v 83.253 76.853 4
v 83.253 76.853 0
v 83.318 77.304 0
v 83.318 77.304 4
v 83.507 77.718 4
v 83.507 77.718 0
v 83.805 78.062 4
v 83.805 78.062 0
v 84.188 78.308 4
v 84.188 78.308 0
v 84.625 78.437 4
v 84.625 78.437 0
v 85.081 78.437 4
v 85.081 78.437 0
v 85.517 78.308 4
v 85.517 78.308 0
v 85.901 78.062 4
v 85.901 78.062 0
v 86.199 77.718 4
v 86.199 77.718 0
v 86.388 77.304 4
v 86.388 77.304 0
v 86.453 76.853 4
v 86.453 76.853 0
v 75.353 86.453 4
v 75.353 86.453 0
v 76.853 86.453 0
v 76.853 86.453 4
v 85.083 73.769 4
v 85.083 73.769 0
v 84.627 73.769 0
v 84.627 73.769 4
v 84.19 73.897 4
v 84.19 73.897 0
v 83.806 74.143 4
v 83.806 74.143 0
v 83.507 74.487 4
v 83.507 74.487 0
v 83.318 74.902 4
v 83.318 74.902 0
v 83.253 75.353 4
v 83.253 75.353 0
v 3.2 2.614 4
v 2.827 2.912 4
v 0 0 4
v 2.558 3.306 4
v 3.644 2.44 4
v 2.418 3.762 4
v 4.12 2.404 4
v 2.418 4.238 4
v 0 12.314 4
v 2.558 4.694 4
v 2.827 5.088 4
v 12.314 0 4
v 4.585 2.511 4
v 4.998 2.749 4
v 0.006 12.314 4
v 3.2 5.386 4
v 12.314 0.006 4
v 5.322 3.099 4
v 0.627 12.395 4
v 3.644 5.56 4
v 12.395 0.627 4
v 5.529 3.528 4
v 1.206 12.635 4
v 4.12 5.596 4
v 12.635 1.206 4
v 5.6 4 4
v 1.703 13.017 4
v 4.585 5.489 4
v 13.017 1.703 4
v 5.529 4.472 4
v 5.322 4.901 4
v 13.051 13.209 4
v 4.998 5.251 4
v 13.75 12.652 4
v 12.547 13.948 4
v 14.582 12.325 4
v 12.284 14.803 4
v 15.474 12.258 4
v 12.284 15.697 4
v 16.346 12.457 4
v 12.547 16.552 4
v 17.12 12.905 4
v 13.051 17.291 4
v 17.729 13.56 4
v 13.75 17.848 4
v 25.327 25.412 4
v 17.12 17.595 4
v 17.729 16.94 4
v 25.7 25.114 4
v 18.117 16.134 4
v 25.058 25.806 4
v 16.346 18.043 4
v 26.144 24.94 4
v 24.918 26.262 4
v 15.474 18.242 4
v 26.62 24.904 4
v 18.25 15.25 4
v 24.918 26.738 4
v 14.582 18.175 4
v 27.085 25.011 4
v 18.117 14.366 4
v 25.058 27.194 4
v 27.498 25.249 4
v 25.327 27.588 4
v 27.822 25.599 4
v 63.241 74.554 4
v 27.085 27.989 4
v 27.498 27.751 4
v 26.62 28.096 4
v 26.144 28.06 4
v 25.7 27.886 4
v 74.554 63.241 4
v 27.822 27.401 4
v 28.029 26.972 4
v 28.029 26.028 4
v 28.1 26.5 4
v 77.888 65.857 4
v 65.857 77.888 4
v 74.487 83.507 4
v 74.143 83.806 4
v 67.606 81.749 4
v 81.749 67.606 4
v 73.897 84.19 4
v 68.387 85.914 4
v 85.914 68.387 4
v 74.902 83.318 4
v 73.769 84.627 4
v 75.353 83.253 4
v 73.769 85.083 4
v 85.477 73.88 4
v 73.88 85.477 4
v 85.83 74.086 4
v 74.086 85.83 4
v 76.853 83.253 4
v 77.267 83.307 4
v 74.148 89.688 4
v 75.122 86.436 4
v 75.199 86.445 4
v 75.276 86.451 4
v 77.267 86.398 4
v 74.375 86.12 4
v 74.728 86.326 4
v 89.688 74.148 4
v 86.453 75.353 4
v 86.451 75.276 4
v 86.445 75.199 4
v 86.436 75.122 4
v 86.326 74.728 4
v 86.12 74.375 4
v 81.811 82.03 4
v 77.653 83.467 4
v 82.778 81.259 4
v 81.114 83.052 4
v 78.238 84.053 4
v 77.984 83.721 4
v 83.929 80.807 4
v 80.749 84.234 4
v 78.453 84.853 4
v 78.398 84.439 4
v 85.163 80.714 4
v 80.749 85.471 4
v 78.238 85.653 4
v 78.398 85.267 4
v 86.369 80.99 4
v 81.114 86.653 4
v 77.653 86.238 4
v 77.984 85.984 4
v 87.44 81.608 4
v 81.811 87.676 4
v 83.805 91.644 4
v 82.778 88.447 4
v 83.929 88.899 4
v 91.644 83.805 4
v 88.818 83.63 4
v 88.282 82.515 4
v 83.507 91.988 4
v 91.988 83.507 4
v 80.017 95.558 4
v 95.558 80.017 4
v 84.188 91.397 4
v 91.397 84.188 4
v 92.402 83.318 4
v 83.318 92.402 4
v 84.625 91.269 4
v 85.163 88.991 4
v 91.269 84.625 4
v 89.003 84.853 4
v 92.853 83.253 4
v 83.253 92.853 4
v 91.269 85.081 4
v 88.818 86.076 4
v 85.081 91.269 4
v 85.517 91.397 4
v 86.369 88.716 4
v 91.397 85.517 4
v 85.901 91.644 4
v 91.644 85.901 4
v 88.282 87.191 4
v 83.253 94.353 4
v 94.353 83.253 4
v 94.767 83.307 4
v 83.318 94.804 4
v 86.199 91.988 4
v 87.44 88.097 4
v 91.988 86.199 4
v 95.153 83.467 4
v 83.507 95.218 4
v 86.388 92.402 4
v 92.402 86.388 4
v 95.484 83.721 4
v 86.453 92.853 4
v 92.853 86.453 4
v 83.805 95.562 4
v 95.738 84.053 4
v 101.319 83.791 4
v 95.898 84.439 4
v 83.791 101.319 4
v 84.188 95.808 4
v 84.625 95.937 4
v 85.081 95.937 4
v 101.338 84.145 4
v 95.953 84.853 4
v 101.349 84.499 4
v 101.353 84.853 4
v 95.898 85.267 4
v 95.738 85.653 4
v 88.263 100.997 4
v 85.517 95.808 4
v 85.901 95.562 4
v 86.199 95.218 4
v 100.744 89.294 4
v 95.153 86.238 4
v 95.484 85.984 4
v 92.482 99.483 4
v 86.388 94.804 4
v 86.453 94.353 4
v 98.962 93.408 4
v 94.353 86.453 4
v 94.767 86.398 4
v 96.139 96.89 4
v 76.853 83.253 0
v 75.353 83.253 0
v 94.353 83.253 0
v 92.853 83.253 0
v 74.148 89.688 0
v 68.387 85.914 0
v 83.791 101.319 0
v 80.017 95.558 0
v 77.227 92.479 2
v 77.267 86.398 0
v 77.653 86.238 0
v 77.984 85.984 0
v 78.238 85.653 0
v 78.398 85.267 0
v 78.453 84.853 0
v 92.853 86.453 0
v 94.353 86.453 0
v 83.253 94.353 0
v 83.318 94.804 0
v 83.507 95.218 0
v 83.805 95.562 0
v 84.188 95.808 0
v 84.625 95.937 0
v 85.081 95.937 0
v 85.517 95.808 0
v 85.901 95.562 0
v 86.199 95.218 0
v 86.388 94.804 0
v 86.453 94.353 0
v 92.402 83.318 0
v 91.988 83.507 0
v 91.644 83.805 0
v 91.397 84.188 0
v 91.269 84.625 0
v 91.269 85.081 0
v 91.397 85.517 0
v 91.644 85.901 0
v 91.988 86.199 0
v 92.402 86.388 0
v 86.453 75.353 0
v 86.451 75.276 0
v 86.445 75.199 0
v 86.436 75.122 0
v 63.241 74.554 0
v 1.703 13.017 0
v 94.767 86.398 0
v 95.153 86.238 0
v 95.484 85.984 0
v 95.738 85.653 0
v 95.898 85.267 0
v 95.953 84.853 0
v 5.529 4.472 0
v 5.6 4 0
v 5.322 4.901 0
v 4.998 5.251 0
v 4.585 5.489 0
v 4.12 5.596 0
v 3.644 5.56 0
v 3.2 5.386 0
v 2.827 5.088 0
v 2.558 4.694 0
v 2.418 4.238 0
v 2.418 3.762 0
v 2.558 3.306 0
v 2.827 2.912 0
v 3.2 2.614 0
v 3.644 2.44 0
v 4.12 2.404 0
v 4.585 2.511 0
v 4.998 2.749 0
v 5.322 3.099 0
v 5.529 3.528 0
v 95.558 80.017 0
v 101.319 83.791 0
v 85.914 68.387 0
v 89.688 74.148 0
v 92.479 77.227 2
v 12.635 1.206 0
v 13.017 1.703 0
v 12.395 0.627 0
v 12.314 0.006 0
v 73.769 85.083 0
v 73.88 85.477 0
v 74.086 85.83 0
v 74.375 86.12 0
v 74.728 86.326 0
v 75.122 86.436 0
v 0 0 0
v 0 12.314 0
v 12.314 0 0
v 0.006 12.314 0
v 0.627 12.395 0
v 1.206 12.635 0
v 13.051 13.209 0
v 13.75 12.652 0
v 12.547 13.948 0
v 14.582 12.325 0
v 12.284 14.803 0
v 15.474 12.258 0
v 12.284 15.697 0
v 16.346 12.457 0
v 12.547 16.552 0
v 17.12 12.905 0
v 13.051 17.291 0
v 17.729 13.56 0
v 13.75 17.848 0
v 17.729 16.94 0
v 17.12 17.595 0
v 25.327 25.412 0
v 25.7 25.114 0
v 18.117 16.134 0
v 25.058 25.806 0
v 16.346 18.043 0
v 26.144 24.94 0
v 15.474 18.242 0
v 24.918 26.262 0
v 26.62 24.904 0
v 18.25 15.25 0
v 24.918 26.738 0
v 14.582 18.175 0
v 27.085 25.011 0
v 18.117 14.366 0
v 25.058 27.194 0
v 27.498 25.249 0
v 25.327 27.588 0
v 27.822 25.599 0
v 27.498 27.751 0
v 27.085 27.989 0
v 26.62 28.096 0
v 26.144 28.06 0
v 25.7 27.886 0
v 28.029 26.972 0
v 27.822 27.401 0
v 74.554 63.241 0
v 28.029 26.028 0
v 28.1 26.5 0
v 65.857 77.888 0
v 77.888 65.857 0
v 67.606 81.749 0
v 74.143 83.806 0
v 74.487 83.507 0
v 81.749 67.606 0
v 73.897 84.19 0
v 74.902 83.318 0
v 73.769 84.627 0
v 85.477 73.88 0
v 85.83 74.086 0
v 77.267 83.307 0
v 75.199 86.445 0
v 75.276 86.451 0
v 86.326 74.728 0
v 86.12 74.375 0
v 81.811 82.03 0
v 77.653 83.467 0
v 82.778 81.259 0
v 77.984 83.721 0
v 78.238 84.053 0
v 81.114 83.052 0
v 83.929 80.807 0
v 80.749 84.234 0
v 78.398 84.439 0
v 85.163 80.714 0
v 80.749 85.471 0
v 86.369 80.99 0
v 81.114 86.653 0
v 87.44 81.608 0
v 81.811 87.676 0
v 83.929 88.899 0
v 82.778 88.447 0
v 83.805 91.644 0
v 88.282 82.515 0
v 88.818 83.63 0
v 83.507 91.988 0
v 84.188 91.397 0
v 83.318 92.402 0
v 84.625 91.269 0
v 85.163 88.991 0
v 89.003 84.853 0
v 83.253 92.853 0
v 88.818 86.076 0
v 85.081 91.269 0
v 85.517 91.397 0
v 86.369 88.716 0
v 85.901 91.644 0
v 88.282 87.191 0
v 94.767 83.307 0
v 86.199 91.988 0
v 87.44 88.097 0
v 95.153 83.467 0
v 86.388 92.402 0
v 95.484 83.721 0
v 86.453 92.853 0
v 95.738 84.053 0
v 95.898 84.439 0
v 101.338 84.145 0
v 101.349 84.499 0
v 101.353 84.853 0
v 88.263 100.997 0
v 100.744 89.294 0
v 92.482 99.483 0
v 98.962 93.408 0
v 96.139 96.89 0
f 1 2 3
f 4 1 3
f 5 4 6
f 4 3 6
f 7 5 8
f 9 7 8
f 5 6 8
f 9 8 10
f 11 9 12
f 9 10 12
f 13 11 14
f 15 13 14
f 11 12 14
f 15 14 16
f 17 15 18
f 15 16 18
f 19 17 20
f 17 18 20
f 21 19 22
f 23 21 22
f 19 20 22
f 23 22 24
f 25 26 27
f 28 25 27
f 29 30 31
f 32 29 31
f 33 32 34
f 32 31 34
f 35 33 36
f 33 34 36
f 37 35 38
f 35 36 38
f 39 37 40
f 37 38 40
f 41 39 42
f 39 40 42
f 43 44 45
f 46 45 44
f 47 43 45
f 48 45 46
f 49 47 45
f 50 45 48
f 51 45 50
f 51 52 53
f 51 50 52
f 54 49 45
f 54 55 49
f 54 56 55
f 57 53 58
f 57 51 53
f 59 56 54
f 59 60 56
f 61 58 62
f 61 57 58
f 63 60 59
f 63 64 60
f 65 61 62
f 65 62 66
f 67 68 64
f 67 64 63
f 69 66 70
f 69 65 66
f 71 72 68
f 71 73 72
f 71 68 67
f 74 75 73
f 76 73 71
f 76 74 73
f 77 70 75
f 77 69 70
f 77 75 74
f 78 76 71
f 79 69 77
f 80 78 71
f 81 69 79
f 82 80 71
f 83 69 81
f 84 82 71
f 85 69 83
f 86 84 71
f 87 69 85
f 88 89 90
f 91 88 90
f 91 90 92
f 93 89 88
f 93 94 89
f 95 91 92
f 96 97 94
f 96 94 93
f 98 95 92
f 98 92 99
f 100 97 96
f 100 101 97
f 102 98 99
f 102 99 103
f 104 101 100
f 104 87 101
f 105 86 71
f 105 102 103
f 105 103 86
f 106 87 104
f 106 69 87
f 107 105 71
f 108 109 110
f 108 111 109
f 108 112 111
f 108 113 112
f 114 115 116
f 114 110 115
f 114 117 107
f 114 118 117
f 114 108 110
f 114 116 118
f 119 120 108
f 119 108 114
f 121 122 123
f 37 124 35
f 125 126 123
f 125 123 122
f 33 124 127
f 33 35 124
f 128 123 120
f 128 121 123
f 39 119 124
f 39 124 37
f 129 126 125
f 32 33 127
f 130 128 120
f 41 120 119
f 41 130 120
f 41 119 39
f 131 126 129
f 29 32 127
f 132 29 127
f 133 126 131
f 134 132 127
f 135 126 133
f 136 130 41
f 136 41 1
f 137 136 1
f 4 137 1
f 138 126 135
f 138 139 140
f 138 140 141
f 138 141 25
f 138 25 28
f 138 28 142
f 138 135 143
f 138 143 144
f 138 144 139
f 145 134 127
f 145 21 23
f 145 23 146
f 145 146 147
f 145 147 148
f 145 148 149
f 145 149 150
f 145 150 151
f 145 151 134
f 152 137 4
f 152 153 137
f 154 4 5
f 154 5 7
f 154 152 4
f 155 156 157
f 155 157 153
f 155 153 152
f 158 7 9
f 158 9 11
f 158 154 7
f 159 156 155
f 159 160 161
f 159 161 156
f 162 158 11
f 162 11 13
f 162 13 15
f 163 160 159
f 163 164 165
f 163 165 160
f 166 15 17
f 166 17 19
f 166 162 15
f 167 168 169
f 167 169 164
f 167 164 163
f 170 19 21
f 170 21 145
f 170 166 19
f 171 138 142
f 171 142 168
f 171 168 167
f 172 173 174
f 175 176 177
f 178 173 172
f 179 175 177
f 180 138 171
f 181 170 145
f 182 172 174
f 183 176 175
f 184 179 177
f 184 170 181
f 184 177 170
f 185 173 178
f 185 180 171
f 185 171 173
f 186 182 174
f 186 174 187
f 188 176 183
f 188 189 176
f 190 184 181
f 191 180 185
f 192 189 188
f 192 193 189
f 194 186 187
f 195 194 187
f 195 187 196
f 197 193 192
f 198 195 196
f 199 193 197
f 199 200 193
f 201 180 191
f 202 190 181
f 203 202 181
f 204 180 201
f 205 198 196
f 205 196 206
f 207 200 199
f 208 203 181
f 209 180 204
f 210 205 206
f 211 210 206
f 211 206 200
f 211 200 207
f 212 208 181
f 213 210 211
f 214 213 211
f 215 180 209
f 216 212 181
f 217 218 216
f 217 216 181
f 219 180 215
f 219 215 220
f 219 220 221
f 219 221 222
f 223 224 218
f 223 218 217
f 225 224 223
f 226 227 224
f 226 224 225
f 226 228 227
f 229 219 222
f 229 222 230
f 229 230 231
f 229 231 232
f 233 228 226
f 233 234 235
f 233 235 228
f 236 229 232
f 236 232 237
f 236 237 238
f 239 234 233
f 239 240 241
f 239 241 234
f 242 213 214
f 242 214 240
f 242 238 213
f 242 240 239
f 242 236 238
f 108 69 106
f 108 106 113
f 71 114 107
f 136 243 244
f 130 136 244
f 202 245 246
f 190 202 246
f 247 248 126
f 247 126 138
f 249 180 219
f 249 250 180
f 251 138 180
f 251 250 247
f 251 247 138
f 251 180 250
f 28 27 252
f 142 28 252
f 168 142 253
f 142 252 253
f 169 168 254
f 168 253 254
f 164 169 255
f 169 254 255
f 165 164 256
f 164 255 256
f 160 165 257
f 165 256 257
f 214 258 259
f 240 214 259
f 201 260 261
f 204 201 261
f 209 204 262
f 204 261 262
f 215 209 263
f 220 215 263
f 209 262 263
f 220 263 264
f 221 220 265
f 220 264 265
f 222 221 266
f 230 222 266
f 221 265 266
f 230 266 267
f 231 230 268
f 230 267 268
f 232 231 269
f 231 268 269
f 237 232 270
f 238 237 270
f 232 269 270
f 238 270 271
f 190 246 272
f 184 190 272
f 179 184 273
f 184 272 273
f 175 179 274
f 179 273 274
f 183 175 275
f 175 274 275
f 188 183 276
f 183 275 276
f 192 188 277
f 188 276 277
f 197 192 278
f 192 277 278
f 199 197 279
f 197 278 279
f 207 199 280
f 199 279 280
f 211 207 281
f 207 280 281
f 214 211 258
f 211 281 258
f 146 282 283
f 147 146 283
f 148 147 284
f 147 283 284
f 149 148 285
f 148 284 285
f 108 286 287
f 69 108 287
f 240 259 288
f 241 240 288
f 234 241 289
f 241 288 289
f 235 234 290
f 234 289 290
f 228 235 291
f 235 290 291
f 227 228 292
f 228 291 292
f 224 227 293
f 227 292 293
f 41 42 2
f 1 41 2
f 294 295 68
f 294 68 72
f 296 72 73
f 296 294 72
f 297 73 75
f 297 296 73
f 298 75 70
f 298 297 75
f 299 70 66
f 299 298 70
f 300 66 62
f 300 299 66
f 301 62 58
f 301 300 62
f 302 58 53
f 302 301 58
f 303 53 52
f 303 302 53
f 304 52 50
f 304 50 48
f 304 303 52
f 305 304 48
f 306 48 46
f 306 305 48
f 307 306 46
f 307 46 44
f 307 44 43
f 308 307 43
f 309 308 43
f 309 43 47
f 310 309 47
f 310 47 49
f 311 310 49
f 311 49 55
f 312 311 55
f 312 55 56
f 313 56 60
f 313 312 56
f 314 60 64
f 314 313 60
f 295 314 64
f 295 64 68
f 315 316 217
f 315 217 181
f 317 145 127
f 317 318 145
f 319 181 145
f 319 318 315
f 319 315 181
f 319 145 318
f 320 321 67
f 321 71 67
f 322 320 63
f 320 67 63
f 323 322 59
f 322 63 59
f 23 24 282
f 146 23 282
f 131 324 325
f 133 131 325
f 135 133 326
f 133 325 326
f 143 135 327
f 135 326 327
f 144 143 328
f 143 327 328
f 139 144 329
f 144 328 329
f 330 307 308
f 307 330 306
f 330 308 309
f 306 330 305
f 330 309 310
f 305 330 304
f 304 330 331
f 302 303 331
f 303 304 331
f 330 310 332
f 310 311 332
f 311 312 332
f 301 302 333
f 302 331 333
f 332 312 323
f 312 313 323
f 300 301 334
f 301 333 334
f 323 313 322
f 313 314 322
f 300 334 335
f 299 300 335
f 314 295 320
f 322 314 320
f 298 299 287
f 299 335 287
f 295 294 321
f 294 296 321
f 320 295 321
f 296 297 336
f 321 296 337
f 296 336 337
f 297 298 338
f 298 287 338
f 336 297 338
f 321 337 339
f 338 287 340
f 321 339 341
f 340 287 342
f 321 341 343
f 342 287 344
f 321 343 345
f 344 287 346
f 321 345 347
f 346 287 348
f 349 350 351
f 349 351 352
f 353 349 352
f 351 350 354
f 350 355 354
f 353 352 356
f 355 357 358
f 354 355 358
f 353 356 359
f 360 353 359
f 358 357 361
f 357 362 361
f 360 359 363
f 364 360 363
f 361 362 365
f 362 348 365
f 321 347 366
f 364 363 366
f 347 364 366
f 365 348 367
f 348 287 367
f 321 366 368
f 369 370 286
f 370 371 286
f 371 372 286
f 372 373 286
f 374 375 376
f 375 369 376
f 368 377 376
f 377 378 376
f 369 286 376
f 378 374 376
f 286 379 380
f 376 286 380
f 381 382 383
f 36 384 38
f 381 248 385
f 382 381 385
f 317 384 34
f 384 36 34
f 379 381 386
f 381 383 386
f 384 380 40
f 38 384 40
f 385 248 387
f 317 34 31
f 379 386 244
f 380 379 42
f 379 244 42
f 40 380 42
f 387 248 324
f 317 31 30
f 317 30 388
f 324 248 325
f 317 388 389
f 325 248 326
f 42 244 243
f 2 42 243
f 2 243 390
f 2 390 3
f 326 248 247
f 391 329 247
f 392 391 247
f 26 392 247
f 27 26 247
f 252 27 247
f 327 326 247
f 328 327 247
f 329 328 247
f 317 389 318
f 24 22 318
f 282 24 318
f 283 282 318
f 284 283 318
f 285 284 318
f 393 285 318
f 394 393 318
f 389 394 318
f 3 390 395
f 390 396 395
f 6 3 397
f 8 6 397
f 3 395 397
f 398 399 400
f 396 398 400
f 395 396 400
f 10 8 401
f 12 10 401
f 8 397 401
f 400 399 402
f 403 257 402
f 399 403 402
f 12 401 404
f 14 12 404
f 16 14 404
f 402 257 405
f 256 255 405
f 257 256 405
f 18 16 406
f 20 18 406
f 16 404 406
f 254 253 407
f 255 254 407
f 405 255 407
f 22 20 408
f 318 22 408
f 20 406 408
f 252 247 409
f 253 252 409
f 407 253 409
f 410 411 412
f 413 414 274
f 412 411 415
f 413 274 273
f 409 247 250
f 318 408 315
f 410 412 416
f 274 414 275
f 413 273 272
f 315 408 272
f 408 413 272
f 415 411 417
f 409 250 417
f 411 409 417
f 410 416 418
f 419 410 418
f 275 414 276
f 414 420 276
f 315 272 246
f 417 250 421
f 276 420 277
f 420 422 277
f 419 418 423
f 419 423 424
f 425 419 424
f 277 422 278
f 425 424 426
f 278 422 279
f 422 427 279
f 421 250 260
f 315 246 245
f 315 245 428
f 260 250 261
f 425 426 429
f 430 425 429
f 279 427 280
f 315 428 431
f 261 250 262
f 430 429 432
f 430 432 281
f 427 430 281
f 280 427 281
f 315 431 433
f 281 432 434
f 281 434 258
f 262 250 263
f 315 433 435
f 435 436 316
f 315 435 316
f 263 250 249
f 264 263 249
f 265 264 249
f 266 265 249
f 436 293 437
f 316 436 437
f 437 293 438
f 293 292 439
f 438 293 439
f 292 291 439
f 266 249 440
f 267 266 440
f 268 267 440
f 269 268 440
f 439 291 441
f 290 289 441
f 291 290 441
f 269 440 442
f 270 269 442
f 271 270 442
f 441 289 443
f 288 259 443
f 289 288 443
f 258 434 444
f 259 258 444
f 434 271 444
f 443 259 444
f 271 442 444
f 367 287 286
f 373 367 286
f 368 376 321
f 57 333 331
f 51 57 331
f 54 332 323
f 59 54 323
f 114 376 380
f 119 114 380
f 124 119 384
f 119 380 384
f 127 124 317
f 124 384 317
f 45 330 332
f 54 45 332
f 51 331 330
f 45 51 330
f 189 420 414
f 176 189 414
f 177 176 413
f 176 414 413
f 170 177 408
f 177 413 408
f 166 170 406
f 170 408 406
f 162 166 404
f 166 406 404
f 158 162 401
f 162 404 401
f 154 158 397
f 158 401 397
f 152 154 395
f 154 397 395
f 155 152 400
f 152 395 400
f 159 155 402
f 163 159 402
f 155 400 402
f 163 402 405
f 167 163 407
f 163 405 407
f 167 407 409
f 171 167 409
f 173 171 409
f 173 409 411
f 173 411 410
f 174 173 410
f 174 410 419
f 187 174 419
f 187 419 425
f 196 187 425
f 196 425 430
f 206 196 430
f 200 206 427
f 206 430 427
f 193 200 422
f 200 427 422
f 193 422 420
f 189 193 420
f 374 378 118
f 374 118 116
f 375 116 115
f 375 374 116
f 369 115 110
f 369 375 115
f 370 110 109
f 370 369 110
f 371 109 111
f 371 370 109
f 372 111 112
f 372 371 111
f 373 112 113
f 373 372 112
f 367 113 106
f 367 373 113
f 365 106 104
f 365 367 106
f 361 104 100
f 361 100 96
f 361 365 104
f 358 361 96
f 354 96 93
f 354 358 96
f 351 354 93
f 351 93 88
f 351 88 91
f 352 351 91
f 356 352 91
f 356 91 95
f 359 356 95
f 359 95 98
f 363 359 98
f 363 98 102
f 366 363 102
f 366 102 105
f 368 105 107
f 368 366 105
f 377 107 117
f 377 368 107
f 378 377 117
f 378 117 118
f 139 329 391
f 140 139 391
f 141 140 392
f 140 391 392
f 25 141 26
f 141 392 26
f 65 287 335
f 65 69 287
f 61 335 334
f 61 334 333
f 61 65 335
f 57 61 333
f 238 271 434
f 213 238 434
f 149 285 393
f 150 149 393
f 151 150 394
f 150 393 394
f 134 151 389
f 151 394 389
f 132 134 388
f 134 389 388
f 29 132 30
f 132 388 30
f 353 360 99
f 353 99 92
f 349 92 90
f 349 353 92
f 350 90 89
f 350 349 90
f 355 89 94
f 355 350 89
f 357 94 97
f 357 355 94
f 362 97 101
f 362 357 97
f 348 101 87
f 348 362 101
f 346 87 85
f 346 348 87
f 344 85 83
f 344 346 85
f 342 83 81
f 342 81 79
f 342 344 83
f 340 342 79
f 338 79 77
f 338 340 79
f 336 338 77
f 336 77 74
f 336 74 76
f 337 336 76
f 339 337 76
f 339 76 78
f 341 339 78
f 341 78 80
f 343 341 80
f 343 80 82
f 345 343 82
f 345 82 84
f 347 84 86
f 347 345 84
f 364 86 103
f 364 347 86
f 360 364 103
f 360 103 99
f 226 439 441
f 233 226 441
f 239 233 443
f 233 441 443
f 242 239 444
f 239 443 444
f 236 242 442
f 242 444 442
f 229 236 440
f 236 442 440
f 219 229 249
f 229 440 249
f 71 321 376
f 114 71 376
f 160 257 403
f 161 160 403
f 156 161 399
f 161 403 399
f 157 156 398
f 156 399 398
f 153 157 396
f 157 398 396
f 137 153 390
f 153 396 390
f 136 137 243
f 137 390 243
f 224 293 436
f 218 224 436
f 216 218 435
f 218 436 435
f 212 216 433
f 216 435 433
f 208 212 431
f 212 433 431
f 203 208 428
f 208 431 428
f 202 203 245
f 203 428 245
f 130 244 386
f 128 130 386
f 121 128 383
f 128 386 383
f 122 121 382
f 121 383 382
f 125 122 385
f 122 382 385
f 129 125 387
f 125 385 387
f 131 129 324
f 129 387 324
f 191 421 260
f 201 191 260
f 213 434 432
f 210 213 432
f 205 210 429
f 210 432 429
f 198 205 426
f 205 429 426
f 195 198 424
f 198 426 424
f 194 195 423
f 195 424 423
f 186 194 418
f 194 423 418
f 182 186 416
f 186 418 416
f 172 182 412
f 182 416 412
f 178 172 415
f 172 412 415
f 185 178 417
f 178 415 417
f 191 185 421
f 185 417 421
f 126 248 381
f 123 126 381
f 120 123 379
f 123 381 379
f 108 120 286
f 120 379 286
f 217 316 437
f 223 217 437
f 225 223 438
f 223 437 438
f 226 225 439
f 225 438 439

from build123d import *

# Parameters (mm, degrees)
F0_R        = 1.6
F0_R_2      = 3
F1_DEPTH    = 4
F2_T1_DEPTH = 4
F3_R        = 2.4


# Not quite as in the source:
# - a fillet or chamfer that OpenCascade refuses, or shapes differently, is made with other operations: its cross-section is extruded or revolved along the edge and cut away or added


with BuildPart() as f1:
    # F0 (on Top) → F1 (new body)
    with BuildSketch(Plane.XY):
        with BuildLine():
            ThreePointArc((80.3055021759, 68.9917936769), (73.1855518528, 73.1855518528), (68.9917936769, 80.3055021759))
            Line((68.9917936769, 80.3055021759), (1, 12.313708499))
            Line((1, 12.313708499), (0, 11.313708499))
            Line((0, 11.313708499), (0, 0))
            Line((0, 0), (11.313708499, 0))
            Line((11.313708499, 0), (12.313708499, 1))
            Line((12.313708499, 1), (80.3055021759, 68.9917936769))
        make_face()
        with Locations((4, 4)):
            Circle(F0_R, mode=Mode.SUBTRACT)
        with Locations((15.25, 15.25)):
            Circle(F0_R_2, mode=Mode.SUBTRACT)
        with Locations((26.499998178, 26.499998178)):
            Circle(F0_R, mode=Mode.SUBTRACT)
        with BuildLine():
            ThreePointArc((87.7873068843, 81.9183206005), (81.9183206005, 81.9183206005), (81.9183206005, 87.7873068843))
            Line((81.9183206005, 87.7873068843), (79.1959594929, 90.5096679919))
            Line((79.1959594929, 90.5096679919), (75.1224322345, 86.4361407335))
            ThreePointArc((75.1224322345, 86.4361407335), (75.2373217206, 86.4486400465), (75.3528137424, 86.4528137424))
            Line((75.3528137424, 86.4528137424), (76.8528137424, 86.4528137424))
            ThreePointArc((76.8528137424, 86.4528137424), (77.9841845923, 85.9841845923), (78.4528137424, 84.8528137424))
            ThreePointArc((78.4528137424, 84.8528137424), (77.9841845923, 83.7214428925), (76.8528137424, 83.2528137424))
            Line((76.8528137424, 83.2528137424), (75.3528137424, 83.2528137424))
            ThreePointArc((75.3528137424, 83.2528137424), (74.1427289494, 83.8060593329), (73.7694867513, 85.0831952502))
            Line((73.7694867513, 85.0831952502), (68.9917936769, 80.3055021759))
            ThreePointArc((68.9917936769, 80.3055021759), (73.1855518528, 73.1855518528), (80.3055021759, 68.9917936769))
            Line((80.3055021759, 68.9917936769), (85.0831952502, 73.7694867513))
            ThreePointArc((85.0831952502, 73.7694867513), (83.8060593329, 74.1427289494), (83.2528137424, 75.3528137424))
            Line((83.2528137424, 75.3528137424), (83.2528137424, 76.8528137424))
            ThreePointArc((83.2528137424, 76.8528137424), (84.8528137424, 78.4528137424), (86.4528137424, 76.8528137424))
            Line((86.4528137424, 76.8528137424), (86.4528137424, 75.3528137424))
            ThreePointArc((86.4528137424, 75.3528137424), (86.4486400465, 75.2373217206), (86.4361407335, 75.1224322345))
            Line((86.4361407335, 75.1224322345), (90.5096679919, 79.1959594929))
            Line((90.5096679919, 79.1959594929), (87.7873068843, 81.9183206005))
        make_face()
        with BuildLine():
            Line((79.1959594929, 90.5096679919), (81.9183206005, 87.7873068843))
            ThreePointArc((81.9183206005, 87.7873068843), (86.4409499867, 88.6869138023), (89.0028137424, 84.8528137424))
            ThreePointArc((89.0028137424, 84.8528137424), (88.6869138023, 83.2646774981), (87.7873068843, 81.9183206005))
            Line((87.7873068843, 81.9183206005), (90.5096679919, 79.1959594929))
            Line((90.5096679919, 79.1959594929), (86.4361407335, 75.1224322345))
            ThreePointArc((86.4361407335, 75.1224322345), (85.9841845923, 74.2214428925), (85.0831952502, 73.7694867513))
            Line((85.0831952502, 73.7694867513), (80.3055021759, 68.9917936769))
            ThreePointArc((80.3055021759, 68.9917936769), (83.083856654, 68.4479123157), (85.9142893623, 68.3869924902))
            add(Edge.make_bspline(
                [(101.3186349946, 83.7913381225), (90.8947856118, 78.810841873), (85.9142893623, 68.3869924902)],
                knots=[3.9431649716, 3.9431649716, 3.9431649716, 5.4816129892, 5.4816129892, 5.4816129892], degree=2, weights=[1, 0.7184506482, 1]))
            ThreePointArc((101.3186349946, 83.7913381225), (101.3442668418, 84.321800871), (101.3528137424, 84.8528137424))
            ThreePointArc((101.3528137424, 84.8528137424), (96.1385492583, 96.8895148629), (83.7913381225, 101.3186349946))
            add(Edge.make_bspline(
                [(68.3869924902, 85.9142893623), (78.810841873, 90.8947856118), (83.7913381225, 101.3186349946)],
                knots=[0.801572318, 0.801572318, 0.801572318, 2.3400203356, 2.3400203356, 2.3400203356], degree=2, weights=[1, 0.7184506482, 1]))
            ThreePointArc((68.3869924902, 85.9142893623), (68.4479123157, 83.083856654), (68.9917936769, 80.3055021759))
            Line((68.9917936769, 80.3055021759), (73.7694867513, 85.0831952502))
            ThreePointArc((73.7694867513, 85.0831952502), (74.2214428925, 85.9841845923), (75.1224322345, 86.4361407335))
            Line((75.1224322345, 86.4361407335), (79.1959594929, 90.5096679919))
        make_face()
        with BuildLine():
            ThreePointArc((95.9528137424, 84.8528137424), (95.4841845923, 83.7214428925), (94.3528137424, 83.2528137424))
            Line((94.3528137424, 83.2528137424), (92.8528137424, 83.2528137424))
            ThreePointArc((92.8528137424, 83.2528137424), (91.2528137424, 84.8528137424), (92.8528137424, 86.4528137424))
            Line((92.8528137424, 86.4528137424), (94.3528137424, 86.4528137424))
            ThreePointArc((94.3528137424, 86.4528137424), (95.4841845923, 85.9841845923), (95.9528137424, 84.8528137424))
        make_face(mode=Mode.SUBTRACT)
        with BuildLine():
            Line((83.2528137424, 92.8528137424), (83.2528137424, 94.3528137424))
            ThreePointArc((83.2528137424, 94.3528137424), (84.8528137424, 95.9528137424), (86.4528137424, 94.3528137424))
            Line((86.4528137424, 94.3528137424), (86.4528137424, 92.8528137424))
            ThreePointArc((86.4528137424, 92.8528137424), (84.8528137424, 91.2528137424), (83.2528137424, 92.8528137424))
        make_face(mode=Mode.SUBTRACT)
        Polygon((12.313708499, 0), (12.313708499, 1), (11.313708499, 0), align=None)
        Polygon((0, 11.313708499), (1, 12.313708499), (0, 12.313708499), align=None)
    extrude(amount=F1_DEPTH)

    # F2: fillet of radius 17.7 on 2 edges, made by hand

    # F2_s2 → F2_t1 (join)
    with BuildSketch(Plane.XY):
        with BuildLine():
            ThreePointArc((74.55426567, 63.240557171), (79.7659943294, 66.8474433344), (85.9142893623, 68.3869924902))
            ThreePointArc((85.9142893623, 68.3869924902), (83.083856654, 68.4479123157), (80.3055021759, 68.9917936769))
            Line((80.3055021759, 68.9917936769), (74.55426567, 63.240557171))
        make_face()
        with BuildLine():
            ThreePointArc((68.3869924902, 85.9142893623), (66.8474433344, 79.7659943294), (63.240557171, 74.55426567))
            Line((63.240557171, 74.55426567), (68.9917936769, 80.3055021759))
            ThreePointArc((68.9917936769, 80.3055021759), (68.4479123157, 83.083856654), (68.3869924902, 85.9142893623))
        make_face()
    extrude(amount=F2_T1_DEPTH)

    # F3
    f3_edges = [f1.edges().sort_by_distance(p)[0] for p in [
        (12.313708, 1, 2),
        (1, 12.313708, 2),
    ]]
    fillet(f3_edges, radius=F3_R)


solid = f1.part
